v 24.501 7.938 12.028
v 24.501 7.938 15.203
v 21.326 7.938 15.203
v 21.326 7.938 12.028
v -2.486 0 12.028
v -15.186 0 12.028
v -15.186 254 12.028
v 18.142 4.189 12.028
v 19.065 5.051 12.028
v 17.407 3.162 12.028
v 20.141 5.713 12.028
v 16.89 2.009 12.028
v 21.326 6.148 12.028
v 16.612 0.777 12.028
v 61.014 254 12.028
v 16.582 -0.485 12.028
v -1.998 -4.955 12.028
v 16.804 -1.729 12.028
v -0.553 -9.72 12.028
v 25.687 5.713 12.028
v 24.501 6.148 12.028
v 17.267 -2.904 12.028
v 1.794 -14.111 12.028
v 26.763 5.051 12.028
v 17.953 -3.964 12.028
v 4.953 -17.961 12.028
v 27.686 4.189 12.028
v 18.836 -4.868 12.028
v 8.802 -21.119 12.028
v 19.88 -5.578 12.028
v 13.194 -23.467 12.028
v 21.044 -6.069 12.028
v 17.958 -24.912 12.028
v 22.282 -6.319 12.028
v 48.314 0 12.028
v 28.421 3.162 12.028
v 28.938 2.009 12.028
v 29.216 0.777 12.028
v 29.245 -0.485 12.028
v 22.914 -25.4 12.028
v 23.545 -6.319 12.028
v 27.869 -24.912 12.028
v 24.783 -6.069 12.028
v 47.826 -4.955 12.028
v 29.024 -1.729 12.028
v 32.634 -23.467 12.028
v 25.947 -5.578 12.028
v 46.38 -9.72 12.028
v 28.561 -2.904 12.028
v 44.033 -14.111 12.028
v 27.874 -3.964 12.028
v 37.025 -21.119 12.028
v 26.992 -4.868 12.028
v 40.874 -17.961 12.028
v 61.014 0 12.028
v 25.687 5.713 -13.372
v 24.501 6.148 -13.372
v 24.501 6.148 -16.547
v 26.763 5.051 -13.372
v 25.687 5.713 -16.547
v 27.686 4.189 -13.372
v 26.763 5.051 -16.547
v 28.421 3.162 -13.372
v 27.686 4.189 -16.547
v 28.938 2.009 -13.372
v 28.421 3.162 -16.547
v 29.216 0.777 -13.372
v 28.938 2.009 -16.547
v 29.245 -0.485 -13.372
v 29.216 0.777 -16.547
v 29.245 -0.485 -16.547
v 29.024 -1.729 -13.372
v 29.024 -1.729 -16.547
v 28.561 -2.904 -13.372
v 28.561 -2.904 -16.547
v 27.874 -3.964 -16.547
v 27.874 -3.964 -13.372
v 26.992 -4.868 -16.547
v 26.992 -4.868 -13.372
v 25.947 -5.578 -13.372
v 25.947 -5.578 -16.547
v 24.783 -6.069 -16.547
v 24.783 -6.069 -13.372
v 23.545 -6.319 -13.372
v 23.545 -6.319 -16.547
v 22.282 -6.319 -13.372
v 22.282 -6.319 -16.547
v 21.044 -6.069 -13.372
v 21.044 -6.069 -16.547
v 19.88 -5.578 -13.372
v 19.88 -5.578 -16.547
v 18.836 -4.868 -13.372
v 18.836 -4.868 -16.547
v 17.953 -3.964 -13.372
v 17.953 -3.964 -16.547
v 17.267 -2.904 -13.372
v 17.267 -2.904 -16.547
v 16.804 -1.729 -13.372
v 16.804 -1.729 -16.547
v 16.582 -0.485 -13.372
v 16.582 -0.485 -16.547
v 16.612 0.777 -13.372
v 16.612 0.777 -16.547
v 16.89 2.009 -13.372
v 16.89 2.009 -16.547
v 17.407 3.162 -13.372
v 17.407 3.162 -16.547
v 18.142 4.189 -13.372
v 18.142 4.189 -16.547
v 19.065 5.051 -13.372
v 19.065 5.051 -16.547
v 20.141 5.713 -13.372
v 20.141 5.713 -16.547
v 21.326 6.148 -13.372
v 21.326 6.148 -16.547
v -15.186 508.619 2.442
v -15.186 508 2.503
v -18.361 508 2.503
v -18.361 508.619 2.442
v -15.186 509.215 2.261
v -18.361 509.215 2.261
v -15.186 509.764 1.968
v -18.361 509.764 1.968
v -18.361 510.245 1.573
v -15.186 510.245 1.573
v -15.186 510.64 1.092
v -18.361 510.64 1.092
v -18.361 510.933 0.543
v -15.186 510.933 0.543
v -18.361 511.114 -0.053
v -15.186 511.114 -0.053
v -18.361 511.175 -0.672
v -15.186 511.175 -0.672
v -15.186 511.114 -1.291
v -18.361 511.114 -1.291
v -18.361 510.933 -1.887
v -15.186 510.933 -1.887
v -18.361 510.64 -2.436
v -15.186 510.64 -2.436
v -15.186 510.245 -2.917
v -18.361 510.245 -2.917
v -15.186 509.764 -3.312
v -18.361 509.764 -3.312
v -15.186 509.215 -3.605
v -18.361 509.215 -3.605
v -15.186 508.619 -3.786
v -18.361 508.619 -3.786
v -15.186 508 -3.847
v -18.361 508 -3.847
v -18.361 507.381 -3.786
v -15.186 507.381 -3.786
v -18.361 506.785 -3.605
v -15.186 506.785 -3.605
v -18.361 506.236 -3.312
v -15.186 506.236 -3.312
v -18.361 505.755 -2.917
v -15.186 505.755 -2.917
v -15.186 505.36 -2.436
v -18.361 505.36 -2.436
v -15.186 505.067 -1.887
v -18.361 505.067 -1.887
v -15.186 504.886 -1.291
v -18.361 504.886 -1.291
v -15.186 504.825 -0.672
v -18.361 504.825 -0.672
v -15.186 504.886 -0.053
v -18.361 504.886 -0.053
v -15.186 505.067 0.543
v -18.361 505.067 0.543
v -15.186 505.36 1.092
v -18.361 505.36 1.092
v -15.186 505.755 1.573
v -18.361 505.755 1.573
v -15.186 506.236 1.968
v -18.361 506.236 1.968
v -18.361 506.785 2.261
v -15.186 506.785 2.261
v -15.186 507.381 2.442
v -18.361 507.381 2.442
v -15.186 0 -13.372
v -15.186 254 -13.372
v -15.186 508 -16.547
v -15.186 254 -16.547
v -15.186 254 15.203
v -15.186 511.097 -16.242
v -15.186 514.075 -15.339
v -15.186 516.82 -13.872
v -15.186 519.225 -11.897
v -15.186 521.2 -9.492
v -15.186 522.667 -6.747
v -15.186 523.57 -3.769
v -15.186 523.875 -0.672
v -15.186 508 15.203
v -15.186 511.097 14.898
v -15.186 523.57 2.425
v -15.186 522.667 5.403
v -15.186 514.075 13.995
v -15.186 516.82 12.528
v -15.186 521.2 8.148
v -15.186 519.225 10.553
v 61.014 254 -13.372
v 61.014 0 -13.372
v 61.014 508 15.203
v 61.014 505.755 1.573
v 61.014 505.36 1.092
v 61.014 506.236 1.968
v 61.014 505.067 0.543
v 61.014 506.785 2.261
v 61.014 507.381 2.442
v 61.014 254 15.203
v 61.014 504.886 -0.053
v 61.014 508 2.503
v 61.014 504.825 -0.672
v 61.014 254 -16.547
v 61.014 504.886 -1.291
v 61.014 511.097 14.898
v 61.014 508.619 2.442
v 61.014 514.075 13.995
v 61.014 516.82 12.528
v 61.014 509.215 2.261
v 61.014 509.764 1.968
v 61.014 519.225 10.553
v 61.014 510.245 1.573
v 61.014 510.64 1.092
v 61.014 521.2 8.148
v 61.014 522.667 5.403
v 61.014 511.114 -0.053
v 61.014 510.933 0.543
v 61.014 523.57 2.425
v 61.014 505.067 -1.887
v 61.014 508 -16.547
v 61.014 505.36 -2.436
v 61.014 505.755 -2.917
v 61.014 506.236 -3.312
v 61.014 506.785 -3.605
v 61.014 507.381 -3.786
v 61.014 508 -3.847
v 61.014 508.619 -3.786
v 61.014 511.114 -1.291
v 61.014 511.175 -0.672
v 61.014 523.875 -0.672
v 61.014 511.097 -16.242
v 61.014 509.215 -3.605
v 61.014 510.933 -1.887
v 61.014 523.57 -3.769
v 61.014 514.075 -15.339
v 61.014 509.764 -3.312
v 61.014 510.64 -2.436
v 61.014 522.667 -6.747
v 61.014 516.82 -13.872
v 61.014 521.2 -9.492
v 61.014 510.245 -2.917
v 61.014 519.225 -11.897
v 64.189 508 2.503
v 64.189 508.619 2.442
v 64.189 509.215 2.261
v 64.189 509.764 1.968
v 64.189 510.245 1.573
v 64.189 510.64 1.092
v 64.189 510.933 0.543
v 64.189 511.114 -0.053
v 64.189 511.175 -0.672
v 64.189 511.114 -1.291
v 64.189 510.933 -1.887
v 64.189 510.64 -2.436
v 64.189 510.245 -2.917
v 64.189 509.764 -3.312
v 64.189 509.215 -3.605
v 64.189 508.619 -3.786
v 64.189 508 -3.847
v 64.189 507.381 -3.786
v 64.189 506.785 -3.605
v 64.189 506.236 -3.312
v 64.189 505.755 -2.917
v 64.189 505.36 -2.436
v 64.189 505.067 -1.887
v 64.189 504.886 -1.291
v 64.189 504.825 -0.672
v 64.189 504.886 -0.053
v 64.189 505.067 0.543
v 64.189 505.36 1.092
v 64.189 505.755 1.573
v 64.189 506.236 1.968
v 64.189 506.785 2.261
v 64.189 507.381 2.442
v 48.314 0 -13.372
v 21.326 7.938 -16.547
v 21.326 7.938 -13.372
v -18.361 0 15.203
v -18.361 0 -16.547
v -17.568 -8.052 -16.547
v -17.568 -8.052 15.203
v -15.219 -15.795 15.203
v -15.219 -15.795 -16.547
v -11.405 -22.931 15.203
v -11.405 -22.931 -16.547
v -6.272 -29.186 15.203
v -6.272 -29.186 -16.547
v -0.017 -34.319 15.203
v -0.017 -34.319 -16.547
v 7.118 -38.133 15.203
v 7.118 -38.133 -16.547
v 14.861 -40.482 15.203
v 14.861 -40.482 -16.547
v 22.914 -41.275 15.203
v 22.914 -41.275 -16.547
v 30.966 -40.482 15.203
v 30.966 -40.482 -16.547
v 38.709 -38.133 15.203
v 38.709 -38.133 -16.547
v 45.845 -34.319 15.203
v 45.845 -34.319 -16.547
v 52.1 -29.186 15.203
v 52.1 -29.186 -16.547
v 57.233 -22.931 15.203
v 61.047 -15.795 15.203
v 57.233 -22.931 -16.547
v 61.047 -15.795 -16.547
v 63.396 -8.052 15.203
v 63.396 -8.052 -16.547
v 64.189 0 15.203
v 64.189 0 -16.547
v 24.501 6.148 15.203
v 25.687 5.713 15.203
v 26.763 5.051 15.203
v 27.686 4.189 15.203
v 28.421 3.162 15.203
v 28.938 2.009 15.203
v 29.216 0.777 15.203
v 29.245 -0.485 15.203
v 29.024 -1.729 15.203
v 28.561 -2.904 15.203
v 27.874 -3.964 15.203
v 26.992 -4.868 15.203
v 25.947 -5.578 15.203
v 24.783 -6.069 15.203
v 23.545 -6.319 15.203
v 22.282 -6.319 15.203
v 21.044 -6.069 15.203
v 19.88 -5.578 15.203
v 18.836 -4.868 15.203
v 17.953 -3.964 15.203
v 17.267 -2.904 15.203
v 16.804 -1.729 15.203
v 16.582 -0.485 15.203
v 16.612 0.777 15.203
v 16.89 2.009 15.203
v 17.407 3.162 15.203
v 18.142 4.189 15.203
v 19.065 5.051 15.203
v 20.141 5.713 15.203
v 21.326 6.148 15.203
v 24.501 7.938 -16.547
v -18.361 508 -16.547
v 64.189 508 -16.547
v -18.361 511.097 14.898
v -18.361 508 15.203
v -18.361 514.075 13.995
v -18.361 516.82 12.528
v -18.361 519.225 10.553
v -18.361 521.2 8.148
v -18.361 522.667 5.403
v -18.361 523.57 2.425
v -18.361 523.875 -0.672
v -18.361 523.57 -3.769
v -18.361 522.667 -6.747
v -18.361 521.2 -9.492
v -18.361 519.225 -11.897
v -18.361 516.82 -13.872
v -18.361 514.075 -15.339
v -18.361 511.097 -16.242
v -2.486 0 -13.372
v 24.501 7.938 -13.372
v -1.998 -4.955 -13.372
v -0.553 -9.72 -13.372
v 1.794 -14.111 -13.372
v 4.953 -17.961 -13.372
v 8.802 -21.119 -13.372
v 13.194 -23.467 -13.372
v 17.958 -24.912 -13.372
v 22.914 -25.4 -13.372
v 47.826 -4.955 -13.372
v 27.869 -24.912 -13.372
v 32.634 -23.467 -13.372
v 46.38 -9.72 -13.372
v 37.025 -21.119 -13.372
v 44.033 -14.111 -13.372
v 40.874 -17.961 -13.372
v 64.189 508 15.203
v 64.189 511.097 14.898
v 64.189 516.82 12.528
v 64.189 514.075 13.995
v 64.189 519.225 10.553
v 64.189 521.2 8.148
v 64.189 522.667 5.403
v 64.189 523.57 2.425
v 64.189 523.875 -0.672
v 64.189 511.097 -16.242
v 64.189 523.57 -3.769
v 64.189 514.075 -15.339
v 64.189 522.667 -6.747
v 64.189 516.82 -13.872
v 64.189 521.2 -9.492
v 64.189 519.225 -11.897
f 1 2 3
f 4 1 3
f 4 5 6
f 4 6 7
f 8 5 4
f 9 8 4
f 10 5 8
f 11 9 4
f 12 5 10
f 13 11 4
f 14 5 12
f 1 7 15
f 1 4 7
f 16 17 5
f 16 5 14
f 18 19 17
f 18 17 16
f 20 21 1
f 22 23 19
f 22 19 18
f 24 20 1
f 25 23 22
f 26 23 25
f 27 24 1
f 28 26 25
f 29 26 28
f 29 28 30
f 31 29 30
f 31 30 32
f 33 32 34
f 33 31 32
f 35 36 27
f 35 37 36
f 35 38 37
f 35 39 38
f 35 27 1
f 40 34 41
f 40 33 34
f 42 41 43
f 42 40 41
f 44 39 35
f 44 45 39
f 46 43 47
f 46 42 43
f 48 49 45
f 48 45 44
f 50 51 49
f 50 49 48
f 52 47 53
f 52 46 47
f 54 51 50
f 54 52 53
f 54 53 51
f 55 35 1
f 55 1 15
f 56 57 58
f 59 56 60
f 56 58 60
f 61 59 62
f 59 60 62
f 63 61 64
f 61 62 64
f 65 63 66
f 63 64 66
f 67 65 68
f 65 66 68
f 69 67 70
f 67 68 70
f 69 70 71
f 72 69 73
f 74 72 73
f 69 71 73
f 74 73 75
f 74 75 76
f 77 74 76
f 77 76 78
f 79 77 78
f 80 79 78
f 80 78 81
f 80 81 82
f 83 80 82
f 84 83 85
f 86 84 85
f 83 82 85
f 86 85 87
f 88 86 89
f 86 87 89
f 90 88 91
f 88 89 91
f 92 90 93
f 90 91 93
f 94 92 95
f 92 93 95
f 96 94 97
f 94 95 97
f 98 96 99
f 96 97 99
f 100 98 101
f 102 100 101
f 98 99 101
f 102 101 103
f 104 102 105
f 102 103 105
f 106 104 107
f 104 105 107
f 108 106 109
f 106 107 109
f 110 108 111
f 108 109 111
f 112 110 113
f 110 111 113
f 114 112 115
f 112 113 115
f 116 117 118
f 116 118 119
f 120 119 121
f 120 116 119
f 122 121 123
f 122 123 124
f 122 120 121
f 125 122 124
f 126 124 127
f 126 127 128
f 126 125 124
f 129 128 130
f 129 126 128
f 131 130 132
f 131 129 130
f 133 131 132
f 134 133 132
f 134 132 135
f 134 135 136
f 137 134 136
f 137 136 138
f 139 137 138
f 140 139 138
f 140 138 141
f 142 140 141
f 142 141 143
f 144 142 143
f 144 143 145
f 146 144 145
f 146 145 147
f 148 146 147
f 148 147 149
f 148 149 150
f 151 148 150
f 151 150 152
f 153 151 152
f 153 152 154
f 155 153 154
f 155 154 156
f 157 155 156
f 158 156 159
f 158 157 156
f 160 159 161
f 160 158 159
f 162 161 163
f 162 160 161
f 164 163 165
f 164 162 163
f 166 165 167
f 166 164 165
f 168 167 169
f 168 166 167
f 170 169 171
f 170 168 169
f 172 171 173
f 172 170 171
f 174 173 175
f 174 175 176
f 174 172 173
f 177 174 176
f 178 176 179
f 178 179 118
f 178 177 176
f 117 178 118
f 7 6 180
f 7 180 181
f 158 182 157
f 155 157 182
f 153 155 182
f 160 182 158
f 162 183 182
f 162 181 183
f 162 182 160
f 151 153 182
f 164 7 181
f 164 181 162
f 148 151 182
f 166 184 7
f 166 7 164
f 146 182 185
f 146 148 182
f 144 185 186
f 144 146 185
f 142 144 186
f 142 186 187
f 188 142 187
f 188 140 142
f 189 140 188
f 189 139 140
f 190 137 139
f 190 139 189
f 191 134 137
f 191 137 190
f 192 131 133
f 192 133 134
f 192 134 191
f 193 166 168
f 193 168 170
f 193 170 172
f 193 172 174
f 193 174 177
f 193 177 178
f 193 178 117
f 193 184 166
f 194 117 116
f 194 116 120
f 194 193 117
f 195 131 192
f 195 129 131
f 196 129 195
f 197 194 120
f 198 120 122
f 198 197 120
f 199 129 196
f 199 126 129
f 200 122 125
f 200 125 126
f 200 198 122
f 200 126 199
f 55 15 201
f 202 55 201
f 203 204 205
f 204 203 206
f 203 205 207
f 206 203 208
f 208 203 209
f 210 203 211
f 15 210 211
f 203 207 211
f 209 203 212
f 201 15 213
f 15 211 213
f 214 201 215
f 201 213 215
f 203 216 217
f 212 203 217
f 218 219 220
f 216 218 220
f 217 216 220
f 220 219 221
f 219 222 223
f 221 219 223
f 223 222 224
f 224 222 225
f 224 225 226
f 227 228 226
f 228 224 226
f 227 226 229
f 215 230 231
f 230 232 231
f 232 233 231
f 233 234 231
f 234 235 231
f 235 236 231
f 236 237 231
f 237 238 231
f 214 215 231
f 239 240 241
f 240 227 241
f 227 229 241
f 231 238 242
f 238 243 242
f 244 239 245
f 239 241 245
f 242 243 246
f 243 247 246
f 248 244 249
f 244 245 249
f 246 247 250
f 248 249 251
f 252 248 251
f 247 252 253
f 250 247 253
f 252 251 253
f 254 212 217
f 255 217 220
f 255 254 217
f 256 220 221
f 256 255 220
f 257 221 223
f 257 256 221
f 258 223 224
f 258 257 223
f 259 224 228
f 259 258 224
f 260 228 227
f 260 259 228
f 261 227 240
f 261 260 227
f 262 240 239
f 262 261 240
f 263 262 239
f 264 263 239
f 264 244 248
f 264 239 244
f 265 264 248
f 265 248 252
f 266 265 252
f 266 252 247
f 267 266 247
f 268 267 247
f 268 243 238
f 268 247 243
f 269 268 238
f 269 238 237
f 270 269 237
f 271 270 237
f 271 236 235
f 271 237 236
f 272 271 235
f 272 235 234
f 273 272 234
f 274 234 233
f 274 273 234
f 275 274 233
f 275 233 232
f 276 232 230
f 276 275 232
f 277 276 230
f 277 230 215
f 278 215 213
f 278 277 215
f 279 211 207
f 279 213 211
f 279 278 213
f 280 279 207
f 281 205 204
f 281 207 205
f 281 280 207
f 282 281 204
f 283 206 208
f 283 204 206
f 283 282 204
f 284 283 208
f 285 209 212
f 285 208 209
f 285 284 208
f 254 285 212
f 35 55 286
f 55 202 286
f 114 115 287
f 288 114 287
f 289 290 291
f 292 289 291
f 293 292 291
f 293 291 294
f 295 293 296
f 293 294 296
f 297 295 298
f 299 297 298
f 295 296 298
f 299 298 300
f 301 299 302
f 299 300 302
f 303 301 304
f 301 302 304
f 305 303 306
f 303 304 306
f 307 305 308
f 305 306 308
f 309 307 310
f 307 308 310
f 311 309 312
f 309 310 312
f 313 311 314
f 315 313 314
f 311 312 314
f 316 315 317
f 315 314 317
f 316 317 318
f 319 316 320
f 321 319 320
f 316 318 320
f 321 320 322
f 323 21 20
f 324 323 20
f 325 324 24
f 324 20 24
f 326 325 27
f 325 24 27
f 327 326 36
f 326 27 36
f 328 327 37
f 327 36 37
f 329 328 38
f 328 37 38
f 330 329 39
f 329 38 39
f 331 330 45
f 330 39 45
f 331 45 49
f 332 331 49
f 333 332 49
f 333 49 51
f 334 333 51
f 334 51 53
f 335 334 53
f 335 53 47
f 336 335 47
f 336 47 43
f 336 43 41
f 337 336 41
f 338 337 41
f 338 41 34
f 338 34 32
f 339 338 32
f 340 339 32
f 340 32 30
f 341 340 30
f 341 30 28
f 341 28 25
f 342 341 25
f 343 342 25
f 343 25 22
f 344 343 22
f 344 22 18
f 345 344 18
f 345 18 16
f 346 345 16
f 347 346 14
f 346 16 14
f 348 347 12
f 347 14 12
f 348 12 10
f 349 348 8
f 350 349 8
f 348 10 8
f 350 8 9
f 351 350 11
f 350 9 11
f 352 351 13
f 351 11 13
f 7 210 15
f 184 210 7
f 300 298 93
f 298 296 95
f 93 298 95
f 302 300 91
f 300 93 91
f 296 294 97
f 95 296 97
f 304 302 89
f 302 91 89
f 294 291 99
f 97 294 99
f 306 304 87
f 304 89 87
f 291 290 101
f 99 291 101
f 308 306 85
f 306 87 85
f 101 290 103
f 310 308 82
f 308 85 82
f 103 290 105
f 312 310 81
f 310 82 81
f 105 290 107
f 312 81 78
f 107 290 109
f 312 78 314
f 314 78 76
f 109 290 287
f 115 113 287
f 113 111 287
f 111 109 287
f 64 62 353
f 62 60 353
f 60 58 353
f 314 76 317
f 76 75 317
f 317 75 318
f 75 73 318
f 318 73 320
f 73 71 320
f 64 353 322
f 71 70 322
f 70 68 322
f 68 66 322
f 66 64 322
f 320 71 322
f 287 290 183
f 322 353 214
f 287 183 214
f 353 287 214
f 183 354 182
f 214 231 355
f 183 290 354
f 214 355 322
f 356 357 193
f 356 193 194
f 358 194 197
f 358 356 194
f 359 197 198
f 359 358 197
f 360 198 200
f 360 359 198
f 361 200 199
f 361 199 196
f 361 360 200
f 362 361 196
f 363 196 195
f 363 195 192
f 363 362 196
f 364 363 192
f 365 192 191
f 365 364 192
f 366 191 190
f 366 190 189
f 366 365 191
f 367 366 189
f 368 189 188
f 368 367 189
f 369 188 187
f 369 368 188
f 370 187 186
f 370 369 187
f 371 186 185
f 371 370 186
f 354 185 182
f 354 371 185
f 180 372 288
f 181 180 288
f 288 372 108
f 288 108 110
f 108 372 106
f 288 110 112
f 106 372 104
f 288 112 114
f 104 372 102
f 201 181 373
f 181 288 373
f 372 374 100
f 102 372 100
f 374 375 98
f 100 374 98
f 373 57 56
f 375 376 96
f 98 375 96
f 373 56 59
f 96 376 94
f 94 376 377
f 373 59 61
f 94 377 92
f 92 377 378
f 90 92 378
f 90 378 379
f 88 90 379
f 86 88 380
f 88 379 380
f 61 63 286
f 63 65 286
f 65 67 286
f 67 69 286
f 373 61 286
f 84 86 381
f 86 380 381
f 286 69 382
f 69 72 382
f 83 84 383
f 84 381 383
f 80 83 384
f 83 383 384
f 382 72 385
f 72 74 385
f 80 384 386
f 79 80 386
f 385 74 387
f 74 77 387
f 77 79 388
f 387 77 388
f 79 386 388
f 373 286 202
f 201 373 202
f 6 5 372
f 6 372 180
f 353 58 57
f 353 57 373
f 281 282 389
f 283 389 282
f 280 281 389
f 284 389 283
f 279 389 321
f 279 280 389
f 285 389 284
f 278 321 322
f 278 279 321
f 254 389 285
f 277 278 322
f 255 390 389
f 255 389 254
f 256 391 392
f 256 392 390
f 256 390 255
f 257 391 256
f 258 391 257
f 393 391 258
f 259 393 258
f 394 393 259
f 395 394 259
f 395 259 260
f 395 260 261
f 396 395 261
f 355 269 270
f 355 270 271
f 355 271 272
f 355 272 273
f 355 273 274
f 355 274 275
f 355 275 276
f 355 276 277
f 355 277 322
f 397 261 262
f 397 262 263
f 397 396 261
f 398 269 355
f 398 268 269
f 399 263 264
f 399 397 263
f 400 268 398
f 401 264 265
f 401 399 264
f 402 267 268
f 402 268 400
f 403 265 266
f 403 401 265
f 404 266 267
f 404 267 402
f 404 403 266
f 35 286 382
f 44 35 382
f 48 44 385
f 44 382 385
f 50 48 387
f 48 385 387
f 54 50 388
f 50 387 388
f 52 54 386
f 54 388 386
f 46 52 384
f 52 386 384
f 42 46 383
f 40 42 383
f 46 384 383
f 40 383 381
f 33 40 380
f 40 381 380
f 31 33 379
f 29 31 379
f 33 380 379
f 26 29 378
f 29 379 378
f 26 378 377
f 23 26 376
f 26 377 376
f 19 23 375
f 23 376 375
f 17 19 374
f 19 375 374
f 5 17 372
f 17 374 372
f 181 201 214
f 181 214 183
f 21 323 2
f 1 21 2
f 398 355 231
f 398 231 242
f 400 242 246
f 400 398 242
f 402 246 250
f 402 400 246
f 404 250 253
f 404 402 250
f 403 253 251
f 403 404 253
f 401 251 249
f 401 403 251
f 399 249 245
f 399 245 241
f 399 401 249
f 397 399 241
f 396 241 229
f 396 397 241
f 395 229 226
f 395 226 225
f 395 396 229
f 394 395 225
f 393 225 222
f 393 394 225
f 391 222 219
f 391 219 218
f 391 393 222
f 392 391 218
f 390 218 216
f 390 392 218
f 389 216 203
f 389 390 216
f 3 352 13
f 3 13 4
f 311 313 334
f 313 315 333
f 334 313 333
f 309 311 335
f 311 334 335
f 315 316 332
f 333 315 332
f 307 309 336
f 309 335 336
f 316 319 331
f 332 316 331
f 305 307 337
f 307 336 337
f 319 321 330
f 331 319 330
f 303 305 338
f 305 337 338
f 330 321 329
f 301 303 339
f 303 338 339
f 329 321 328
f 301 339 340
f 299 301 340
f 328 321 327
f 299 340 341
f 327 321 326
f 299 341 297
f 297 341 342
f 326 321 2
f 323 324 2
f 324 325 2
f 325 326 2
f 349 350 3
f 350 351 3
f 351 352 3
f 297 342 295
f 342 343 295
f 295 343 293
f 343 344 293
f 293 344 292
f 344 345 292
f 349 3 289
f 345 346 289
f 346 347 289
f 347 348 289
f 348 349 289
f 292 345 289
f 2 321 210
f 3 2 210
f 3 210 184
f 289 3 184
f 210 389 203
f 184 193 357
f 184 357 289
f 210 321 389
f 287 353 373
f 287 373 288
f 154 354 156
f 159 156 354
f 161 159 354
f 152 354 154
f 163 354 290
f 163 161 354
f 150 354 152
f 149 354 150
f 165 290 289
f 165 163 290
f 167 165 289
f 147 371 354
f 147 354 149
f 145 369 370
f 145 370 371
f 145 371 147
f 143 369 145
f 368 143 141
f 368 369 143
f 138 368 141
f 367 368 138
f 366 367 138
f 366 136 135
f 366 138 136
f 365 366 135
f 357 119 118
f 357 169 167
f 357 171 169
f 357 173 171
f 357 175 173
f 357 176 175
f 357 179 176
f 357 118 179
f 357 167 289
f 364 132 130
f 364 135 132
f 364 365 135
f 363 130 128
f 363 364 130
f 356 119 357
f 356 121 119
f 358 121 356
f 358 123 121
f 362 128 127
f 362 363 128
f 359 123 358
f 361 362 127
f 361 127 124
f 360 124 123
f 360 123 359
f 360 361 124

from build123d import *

# Parameters (mm, degrees)
SKETCH2_W           = 82.55
SKETCH2_H           = 31.75
SKETCH2_W_2         = 76.2
SKETCH2_H_2         = 25.4
EXTRUDE_THIN1_DEPTH = 508
BOSS_EXTRUDE2_DEPTH = 31.75
BOSS_EXTRUDE3_DEPTH = 3.175
BOSS_EXTRUDE4_DEPTH = 3.175
SKETCH6_R           = 6.35
SHAFT_HOLE_DEPTH    = 31.75
SKETCH7_W           = 3.175
SKETCH7_H           = 7.9375
KEYWAY_DEPTH        = 31.75
CUT_EXTRUDE1_START  = -76.651281
SKETCH8_R           = 6.35
CUT_EXTRUDE1_DEPTH  = 57.601281
BOSS_EXTRUDE5_DEPTH = 3.175
BOSS_EXTRUDE6_DEPTH = 3.175
CUT_EXTRUDE2_START  = -82.55
SKETCH11_R          = 3.175
CUT_EXTRUDE2_DEPTH  = 82.55
CUT_EXTRUDE3_START  = -31.75
SKETCH12_W          = 76.2
SKETCH12_H          = 254
CUT_EXTRUDE3_DEPTH  = 31.75


with BuildPart() as part:
    # Sketch2 → Extrude-Thin1 (new body)
    with BuildSketch(Plane(origin=(0, 0, 0), x_dir=(1, 0, 0), z_dir=(0, 1, 0))):
        with Locations((22.913756614, 0.671957672)):
            Rectangle(SKETCH2_W, SKETCH2_H)
        with Locations((22.913756614, 0.671957672)):
            Rectangle(SKETCH2_W_2, SKETCH2_H_2, mode=Mode.SUBTRACT)
    extrude(amount=EXTRUDE_THIN1_DEPTH)

    # Sketch3 → Boss-Extrude2 (add)
    with BuildSketch(Plane(origin=(0, 0, -16.546957672), x_dir=(-1, 0, 0), z_dir=(0, 0, -1))):
        with BuildLine():
            Line((-64.188756614, 0), (-48.313756614, 0))
            ThreePointArc((-48.313756614, 0), (-22.913756614, -25.4), (2.486243386, 0))
            Line((2.486243386, 0), (18.361243386, 0))
            ThreePointArc((18.361243386, 0), (-22.913756614, -41.275), (-64.188756614, 0))
        make_face()
    extrude(amount=-BOSS_EXTRUDE2_DEPTH)

    # Sketch4 → Boss-Extrude3 (add)
    with BuildSketch(Plane(origin=(0, 0, -16.546957672), x_dir=(-1, 0, 0), z_dir=(0, 0, -1))):
        with BuildLine():
            Line((-48.313756614, 0), (2.486243386, 0))
            ThreePointArc((2.486243386, 0), (-22.913756614, -25.4), (-48.313756614, 0))
        make_face()
    extrude(amount=-BOSS_EXTRUDE3_DEPTH)

    # Sketch5 → Boss-Extrude4 (add)
    with BuildSketch(Plane.XY.offset(15.203042328)):
        with BuildLine():
            Line((-2.486243386, 0), (48.313756614, 0))
            ThreePointArc((48.313756614, 0), (22.913756614, -25.4), (-2.486243386, 0))
        make_face()
    extrude(amount=-BOSS_EXTRUDE4_DEPTH)

    # Sketch6 → Shaft Hole (cut)
    with BuildSketch(Plane(origin=(0, 0, -16.546957672), x_dir=(-1, 0, 0), z_dir=(0, 0, -1))):
        with Locations((-22.913756614, 0)):
            Circle(SKETCH6_R)
    extrude(amount=-SHAFT_HOLE_DEPTH, mode=Mode.SUBTRACT)

    # Sketch7 → Keyway (cut)
    with BuildSketch(Plane(origin=(0, 0, -16.546957672), x_dir=(-1, 0, 0), z_dir=(0, 0, -1))):
        with Locations((-22.913756614, 3.96875)):
            Rectangle(SKETCH7_W, SKETCH7_H)
    extrude(amount=-KEYWAY_DEPTH, mode=Mode.SUBTRACT)

    # Sketch8 → Cut-Extrude1 (cut)
    with BuildSketch(Plane(origin=(0, 262.273478836, -262.273478836), x_dir=(-1, 0, 0), z_dir=(0, 0.707106781, -0.707106781)).offset(CUT_EXTRUDE1_START)):
        with Locations((-22.913756614, 322.109778865)):
            Circle(SKETCH8_R)
    extrude(amount=CUT_EXTRUDE1_DEPTH, mode=Mode.SUBTRACT)

    # Sketch9 → Boss-Extrude5 (add)
    with BuildSketch(Plane.ZY.offset(18.361243386)):
        with BuildLine():
            Line((-16.546957672, 508), (-3.846957672, 508))
            Line((-3.846957672, 508), (2.503042328, 508))
            Line((2.503042328, 508), (15.203042328, 508))
            ThreePointArc((15.203042328, 508), (-0.671957672, 523.875), (-16.546957672, 508))
        make_face()
    extrude(amount=-BOSS_EXTRUDE5_DEPTH)

    # Sketch10 → Boss-Extrude6 (add)
    with BuildSketch(Plane(origin=(64.188756614, 0, 0), x_dir=(0, 0, -1), z_dir=(1, 0, 0))):
        with BuildLine():
            Line((-12.028042328, 508), (13.371957672, 508))
            Line((13.371957672, 508), (16.546957672, 508))
            ThreePointArc((16.546957672, 508), (0.671957672, 523.875), (-15.203042328, 508))
            Line((-15.203042328, 508), (-12.028042328, 508))
        make_face()
    extrude(amount=-BOSS_EXTRUDE6_DEPTH)

    # Sketch11 → Cut-Extrude2 (cut)
    with BuildSketch(Plane.ZY.offset(18.361243386).offset(CUT_EXTRUDE2_START)):
        with Locations((-0.671957672, 508)):
            Circle(SKETCH11_R)
    extrude(amount=CUT_EXTRUDE2_DEPTH, mode=Mode.SUBTRACT)

    # Sketch12 → Cut-Extrude3 (cut)
    with BuildSketch(Plane(origin=(0, 0, -16.546957672), x_dir=(-1, 0, 0), z_dir=(0, 0, -1)).offset(CUT_EXTRUDE3_START)):
        with Locations((-22.913756614, 381)):
            Rectangle(SKETCH12_W, SKETCH12_H)
    extrude(amount=CUT_EXTRUDE3_DEPTH, mode=Mode.SUBTRACT)


solid = part.part
